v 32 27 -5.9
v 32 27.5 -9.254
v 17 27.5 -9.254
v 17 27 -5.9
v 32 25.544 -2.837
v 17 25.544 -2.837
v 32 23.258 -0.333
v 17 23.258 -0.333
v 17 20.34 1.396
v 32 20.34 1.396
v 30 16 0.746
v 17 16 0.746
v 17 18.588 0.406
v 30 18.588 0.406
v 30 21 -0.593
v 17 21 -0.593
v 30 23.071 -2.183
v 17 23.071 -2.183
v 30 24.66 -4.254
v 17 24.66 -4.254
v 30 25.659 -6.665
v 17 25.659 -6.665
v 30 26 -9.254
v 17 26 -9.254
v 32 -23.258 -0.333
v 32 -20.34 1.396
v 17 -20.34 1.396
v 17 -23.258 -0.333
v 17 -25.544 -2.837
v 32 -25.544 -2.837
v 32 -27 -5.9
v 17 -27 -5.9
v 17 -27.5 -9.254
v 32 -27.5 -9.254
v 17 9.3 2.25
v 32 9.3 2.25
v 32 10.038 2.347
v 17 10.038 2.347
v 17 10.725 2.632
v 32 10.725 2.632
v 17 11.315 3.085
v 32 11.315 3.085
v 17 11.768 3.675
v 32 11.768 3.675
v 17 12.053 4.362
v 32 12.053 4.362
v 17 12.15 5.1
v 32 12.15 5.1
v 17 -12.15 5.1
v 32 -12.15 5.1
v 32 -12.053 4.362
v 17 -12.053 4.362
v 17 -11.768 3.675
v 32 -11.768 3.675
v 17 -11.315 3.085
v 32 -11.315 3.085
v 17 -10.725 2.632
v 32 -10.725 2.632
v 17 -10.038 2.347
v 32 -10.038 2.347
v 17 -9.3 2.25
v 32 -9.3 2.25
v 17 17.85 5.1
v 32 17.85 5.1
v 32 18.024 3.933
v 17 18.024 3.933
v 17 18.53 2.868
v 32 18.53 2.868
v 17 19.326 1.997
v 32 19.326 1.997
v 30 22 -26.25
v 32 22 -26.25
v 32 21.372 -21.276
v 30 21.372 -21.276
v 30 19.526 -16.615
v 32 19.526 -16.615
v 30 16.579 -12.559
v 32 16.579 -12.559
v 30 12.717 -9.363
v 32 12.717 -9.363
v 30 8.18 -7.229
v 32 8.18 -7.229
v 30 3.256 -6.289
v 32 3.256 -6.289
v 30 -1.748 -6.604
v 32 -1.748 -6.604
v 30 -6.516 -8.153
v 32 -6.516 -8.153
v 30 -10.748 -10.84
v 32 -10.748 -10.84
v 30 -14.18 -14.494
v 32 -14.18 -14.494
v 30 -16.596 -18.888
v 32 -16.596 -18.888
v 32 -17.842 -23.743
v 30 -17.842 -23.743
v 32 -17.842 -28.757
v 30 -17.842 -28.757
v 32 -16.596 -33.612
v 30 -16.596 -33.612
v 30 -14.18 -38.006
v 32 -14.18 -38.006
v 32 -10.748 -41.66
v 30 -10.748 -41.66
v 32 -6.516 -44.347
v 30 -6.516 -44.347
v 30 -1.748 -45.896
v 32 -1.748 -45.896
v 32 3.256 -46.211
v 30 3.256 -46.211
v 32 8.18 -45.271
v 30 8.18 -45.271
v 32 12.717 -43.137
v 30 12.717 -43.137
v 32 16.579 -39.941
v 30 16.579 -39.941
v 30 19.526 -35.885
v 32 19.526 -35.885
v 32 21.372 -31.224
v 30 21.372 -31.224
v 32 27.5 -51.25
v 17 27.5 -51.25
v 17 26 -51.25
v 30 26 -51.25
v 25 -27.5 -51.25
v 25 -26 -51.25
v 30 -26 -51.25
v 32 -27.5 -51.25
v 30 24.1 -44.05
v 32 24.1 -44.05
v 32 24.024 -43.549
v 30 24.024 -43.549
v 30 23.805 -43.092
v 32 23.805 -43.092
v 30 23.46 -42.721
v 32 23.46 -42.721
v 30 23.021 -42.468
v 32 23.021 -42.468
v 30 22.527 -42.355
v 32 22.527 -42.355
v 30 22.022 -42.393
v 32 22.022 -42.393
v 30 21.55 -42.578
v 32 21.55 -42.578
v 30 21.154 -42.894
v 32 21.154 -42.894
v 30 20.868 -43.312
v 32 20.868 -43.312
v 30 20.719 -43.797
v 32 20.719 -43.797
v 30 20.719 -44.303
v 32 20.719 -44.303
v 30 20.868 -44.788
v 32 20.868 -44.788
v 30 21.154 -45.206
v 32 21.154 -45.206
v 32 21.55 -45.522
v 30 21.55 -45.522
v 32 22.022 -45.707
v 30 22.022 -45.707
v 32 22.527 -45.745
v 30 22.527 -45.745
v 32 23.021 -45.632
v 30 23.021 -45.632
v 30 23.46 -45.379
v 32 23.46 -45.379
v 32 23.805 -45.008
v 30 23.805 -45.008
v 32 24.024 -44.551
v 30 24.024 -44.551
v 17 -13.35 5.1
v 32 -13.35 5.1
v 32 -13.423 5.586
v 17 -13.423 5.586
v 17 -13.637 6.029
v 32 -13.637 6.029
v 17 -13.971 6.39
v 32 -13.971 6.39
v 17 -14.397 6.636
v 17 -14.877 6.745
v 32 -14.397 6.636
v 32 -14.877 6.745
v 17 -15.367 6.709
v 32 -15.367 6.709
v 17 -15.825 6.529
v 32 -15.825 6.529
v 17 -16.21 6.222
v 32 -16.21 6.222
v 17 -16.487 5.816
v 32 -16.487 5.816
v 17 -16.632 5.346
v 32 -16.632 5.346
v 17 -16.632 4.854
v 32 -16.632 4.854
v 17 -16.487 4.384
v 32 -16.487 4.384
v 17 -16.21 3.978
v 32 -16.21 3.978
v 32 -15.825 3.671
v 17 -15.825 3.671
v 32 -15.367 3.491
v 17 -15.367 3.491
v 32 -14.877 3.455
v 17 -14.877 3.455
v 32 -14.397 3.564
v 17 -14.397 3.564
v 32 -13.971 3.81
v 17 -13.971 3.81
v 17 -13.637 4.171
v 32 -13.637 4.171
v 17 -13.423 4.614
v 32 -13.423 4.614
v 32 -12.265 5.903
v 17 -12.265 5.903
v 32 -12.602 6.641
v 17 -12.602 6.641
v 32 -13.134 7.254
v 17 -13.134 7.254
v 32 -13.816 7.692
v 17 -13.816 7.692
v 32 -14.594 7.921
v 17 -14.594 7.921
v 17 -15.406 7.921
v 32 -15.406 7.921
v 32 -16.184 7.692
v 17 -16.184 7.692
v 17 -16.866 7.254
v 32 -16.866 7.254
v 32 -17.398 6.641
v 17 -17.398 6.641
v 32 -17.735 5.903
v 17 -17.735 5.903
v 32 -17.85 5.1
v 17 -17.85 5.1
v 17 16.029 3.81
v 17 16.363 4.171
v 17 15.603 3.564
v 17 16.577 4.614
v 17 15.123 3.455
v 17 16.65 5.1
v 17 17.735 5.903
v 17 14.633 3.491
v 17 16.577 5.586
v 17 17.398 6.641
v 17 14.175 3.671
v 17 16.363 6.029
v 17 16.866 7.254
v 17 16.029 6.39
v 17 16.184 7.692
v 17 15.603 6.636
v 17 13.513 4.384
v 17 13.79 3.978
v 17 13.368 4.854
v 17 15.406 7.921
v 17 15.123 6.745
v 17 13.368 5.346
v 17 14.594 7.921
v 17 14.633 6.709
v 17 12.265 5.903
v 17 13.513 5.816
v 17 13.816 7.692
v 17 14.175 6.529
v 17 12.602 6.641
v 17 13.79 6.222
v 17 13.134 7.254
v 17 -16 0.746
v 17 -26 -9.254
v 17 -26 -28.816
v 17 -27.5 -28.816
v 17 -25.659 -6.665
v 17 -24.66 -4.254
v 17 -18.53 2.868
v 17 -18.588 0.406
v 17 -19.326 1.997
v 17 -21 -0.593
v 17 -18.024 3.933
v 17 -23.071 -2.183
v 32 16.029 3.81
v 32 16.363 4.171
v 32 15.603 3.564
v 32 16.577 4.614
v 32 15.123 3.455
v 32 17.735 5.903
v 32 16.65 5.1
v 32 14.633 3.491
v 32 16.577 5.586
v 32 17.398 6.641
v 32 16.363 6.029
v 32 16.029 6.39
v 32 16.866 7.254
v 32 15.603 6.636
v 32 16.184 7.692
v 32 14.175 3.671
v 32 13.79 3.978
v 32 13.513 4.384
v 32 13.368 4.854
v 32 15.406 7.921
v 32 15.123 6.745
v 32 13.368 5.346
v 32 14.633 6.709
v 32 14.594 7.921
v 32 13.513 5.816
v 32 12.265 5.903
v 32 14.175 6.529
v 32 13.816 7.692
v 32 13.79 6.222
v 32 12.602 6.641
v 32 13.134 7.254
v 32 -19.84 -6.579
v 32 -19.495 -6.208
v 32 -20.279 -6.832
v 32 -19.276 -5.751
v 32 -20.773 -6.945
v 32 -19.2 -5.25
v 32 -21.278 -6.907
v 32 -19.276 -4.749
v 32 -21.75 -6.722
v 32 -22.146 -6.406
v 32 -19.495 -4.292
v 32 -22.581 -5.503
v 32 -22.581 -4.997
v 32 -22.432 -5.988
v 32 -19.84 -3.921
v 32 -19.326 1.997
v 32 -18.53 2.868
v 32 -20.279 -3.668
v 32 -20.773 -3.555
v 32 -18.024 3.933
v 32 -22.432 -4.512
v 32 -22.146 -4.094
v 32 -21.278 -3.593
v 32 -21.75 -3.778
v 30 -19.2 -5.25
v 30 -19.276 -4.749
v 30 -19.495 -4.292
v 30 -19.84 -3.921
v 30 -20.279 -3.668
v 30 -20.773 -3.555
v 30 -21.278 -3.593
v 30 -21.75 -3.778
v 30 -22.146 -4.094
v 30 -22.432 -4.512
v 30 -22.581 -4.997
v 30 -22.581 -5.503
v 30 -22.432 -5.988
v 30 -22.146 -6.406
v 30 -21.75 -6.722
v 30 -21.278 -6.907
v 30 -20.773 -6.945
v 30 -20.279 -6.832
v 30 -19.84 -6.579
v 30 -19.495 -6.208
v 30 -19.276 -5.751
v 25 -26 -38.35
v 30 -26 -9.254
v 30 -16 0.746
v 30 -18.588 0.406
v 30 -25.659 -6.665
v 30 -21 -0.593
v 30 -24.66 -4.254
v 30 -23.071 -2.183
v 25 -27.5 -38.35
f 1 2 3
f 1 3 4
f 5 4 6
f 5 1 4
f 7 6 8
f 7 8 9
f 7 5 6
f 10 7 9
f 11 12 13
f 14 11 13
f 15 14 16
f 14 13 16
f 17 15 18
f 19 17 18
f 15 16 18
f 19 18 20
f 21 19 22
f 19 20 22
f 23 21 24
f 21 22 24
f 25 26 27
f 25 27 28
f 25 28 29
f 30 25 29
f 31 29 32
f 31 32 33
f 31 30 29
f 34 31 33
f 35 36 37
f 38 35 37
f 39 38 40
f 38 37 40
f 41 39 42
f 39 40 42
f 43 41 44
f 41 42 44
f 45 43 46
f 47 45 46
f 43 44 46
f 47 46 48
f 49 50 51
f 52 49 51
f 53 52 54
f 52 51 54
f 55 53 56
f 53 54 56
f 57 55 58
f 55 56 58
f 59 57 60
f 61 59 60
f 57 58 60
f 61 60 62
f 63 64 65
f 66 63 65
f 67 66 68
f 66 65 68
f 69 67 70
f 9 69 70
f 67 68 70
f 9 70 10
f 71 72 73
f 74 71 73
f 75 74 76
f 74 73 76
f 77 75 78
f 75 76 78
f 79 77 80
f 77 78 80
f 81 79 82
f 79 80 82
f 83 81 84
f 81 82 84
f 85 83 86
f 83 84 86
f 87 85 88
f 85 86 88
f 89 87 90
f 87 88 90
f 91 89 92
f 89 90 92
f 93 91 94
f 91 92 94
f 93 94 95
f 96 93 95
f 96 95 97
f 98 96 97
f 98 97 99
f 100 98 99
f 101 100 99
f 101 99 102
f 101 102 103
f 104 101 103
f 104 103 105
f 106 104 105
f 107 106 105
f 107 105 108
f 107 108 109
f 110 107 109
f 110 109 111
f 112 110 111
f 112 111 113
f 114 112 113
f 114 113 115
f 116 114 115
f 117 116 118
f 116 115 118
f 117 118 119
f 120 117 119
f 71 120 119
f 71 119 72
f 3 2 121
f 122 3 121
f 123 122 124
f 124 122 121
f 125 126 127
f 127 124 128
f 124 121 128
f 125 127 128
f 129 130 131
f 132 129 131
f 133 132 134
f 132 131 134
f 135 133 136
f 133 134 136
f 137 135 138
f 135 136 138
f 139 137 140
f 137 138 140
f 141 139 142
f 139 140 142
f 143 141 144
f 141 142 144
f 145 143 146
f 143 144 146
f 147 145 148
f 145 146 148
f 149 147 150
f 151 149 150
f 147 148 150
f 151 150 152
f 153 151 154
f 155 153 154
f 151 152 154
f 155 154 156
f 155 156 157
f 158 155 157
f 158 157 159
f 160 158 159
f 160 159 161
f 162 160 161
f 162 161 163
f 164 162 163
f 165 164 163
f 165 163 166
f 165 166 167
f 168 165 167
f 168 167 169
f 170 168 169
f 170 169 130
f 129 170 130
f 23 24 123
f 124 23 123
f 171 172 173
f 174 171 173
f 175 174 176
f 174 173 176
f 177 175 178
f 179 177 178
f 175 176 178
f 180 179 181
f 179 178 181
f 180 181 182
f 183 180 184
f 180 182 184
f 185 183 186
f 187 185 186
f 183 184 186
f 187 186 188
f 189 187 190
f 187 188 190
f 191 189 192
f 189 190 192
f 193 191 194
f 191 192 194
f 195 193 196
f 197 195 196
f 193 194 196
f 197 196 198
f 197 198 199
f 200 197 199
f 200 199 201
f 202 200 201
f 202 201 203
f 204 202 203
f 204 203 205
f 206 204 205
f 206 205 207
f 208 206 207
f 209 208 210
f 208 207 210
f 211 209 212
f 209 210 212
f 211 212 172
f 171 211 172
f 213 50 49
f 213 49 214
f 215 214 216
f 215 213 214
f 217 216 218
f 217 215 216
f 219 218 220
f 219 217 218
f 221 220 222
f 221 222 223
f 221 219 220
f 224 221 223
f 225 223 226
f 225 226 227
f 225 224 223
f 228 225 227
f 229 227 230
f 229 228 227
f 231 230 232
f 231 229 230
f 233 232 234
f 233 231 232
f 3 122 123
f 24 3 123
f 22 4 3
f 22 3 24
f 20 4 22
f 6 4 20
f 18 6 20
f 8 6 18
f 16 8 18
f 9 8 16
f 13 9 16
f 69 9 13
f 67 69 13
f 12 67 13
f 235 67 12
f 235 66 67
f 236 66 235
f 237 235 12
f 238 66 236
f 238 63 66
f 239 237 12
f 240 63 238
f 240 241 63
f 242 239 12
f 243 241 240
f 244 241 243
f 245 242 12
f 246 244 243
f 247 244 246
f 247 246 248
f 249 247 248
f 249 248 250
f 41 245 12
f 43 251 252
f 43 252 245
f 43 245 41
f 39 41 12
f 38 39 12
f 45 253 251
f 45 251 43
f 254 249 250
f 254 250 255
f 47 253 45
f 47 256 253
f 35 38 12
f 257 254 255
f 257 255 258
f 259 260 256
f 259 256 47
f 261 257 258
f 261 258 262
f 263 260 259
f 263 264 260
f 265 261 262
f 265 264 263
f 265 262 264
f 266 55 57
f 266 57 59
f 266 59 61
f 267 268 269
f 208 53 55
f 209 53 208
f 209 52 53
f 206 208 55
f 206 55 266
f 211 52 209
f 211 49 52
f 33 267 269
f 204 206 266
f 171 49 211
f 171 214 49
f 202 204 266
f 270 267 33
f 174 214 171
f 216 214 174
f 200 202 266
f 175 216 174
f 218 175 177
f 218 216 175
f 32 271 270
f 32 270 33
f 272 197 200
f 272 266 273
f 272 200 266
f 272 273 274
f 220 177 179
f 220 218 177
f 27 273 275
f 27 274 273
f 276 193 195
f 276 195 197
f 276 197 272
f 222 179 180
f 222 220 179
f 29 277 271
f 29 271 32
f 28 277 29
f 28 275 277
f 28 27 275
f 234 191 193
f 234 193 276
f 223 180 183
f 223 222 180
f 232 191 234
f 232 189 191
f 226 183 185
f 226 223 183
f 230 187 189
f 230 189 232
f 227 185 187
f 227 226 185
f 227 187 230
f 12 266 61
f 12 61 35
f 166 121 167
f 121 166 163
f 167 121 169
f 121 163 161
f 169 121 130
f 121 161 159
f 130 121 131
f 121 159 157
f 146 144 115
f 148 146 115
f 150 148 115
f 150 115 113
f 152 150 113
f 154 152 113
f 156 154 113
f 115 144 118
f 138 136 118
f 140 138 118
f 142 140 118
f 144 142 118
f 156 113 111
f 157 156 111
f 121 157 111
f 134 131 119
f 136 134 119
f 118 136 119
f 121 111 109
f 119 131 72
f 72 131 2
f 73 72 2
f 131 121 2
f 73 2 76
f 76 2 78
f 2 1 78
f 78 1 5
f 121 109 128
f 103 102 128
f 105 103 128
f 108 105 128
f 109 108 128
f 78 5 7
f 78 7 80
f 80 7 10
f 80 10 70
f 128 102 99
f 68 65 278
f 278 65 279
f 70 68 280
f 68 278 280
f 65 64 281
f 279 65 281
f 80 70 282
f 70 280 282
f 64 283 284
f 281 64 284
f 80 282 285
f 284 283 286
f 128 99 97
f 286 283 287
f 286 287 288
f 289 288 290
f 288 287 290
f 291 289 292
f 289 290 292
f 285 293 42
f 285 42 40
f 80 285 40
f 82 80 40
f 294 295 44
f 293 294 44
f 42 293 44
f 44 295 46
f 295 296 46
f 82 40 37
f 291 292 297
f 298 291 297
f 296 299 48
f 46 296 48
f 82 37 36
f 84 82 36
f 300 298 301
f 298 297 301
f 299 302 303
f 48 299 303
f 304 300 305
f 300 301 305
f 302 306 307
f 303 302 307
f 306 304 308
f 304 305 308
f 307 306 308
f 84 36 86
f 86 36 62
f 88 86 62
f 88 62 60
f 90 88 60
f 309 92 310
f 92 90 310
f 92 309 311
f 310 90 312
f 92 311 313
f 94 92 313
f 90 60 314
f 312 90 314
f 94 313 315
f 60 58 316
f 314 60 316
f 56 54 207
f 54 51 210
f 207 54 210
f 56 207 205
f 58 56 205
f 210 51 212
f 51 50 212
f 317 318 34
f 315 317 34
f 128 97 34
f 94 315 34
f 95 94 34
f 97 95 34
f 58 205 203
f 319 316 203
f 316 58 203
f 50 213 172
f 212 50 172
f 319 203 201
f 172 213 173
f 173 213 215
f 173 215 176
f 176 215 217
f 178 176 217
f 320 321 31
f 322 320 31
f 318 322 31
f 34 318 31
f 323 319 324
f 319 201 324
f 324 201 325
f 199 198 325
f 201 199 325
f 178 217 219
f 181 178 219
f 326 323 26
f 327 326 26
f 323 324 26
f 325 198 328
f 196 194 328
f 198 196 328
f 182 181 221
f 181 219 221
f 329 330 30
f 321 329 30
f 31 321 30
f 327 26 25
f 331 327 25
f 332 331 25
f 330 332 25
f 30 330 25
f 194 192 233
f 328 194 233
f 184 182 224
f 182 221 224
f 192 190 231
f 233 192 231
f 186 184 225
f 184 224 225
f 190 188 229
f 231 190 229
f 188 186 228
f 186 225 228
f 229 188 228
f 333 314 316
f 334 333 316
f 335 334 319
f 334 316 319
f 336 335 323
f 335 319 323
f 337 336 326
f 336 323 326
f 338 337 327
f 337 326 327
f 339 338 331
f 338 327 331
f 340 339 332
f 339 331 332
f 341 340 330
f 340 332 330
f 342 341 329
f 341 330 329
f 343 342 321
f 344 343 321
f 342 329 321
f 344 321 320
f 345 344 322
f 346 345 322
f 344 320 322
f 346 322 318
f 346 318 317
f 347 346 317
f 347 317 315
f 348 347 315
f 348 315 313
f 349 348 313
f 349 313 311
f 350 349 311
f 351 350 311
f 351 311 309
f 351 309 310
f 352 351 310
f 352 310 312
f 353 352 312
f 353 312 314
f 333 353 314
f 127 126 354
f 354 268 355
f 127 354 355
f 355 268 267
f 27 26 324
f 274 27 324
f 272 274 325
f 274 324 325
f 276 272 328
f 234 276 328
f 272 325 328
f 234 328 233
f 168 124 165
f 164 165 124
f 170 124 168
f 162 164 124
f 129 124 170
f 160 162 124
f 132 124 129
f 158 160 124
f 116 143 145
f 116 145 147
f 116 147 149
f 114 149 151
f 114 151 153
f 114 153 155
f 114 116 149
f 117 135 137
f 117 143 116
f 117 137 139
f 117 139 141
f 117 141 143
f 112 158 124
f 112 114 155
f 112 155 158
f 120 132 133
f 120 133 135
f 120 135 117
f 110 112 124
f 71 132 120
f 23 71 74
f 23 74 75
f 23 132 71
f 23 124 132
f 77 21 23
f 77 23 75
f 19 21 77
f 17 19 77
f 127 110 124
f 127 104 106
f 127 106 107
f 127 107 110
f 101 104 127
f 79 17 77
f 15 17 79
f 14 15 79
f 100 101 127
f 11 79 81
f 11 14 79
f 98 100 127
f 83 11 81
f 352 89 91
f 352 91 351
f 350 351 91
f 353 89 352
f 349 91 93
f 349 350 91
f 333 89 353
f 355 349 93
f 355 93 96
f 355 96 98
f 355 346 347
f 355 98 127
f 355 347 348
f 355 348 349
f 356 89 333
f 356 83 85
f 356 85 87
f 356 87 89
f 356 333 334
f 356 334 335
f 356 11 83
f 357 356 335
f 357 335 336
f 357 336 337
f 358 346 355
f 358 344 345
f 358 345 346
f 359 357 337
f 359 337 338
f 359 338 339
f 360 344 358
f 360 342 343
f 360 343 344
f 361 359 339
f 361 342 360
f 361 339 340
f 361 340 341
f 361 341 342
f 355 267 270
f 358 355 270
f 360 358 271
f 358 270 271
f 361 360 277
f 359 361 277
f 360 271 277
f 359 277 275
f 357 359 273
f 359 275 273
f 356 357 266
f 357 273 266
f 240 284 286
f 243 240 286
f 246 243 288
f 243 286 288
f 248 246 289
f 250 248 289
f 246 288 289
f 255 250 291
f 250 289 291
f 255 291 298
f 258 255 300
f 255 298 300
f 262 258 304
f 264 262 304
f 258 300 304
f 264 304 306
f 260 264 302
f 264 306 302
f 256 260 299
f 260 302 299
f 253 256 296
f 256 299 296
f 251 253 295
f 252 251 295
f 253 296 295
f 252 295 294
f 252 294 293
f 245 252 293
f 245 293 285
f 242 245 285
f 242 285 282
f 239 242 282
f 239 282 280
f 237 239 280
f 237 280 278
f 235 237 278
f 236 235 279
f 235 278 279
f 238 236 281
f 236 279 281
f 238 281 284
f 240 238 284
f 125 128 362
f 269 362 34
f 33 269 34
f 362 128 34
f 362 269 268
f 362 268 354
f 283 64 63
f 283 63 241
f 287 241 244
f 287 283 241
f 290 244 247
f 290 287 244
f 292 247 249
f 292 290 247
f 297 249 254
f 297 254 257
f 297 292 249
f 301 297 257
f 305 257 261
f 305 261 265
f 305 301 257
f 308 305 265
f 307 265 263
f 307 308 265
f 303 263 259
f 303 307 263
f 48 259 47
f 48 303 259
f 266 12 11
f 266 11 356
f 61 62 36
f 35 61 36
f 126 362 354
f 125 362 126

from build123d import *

# Parameters (mm, degrees)
PAD043_DEPTH    = 15
POCKET057_DEPTH = 13
SKETCH118_R     = 1.65
SKETCH118_R_2   = 1.7
SKETCH118_R_3   = 20
POCKET058_DEPTH = 15
POCKET059_DEPTH = 5


with BuildPart() as part:
    # Sketch116 → Pad043 (new body)
    with BuildSketch(Plane.YZ):
        with BuildLine():
            Line((27.5, -9.253658), (27.5, -51.25))
            Line((27.5, -51.25), (-27.5, -51.25))
            Line((-27.5, -51.25), (-27.5, -9.253658))
            ThreePointArc((-20.340323, 1.39583), (-25.543681, -2.837417), (-27.5, -9.253658))
            ThreePointArc((-20.340323, 1.39583), (-18.530459, 2.868264), (-17.85, 5.1))
            ThreePointArc((-12.15, 5.1), (-15, 7.95), (-17.85, 5.1))
            ThreePointArc((-12.15, 5.1), (-11.315254, 3.084746), (-9.3, 2.25))
            Line((-9.3, 2.25), (9.3, 2.25))
            ThreePointArc((9.3, 2.25), (11.315254, 3.084746), (12.15, 5.1))
            ThreePointArc((17.85, 5.1), (15, 7.95), (12.15, 5.1))
            ThreePointArc((17.85, 5.1), (18.530459, 2.868264), (20.340323, 1.39583))
            ThreePointArc((27.5, -9.253658), (25.543681, -2.837417), (20.340323, 1.39583))
        make_face()
    extrude(amount=-PAD043_DEPTH)

    # Sketch117 (on Face14 of Pad043) → Pocket057 (cut)
    with BuildSketch(Plane(origin=(-15, 0, 0), x_dir=(0, -1, 0), z_dir=(-1, 0, 0))):
        with BuildLine():
            Line((-26, -9.253658), (-26, -51.25))
            Line((-26, -51.25), (26, -51.25))
            Line((26, -51.25), (26, -9.253658))
            ThreePointArc((26, -9.253658), (23.071068, -2.18259), (16, 0.746342))
            Line((-16, 0.746342), (16, 0.746342))
            ThreePointArc((-16, 0.746342), (-23.071068, -2.18259), (-26, -9.253658))
        make_face()
    extrude(amount=-POCKET057_DEPTH, mode=Mode.SUBTRACT)

    # Sketch118 (on Face4 of Pocket057) → Pocket058 (cut)
    with BuildSketch(Plane.YZ):
        with Locations((-15, 5.1)):
            Circle(SKETCH118_R)
        with Locations((15, 5.1)):
            Circle(SKETCH118_R)
        with Locations((22.4, -44.05)):
            Circle(SKETCH118_R_2)
        with Locations((-20.9, -5.25)):
            Circle(SKETCH118_R_2)
        with Locations((2, -26.25)):
            Circle(SKETCH118_R_3)
    extrude(amount=-POCKET058_DEPTH, mode=Mode.SUBTRACT)

    # Sketch119 (on Face11 of Pocket058) → Pocket059 (cut)
    with BuildSketch(Plane(origin=(0, -27.5, 0), x_dir=(0, 0, 1), z_dir=(0, -1, 0))):
        Polygon((-51.25, 15), (-28.815971, 15), (-38.35, 7), (-51.25, 7), align=None)
    extrude(amount=-POCKET059_DEPTH, mode=Mode.SUBTRACT)


with BuildPart() as part_1:
    # Body016 placement: moved
    add(part.part.moved(Location((32, 0, 0))))


solid = part_1.part
